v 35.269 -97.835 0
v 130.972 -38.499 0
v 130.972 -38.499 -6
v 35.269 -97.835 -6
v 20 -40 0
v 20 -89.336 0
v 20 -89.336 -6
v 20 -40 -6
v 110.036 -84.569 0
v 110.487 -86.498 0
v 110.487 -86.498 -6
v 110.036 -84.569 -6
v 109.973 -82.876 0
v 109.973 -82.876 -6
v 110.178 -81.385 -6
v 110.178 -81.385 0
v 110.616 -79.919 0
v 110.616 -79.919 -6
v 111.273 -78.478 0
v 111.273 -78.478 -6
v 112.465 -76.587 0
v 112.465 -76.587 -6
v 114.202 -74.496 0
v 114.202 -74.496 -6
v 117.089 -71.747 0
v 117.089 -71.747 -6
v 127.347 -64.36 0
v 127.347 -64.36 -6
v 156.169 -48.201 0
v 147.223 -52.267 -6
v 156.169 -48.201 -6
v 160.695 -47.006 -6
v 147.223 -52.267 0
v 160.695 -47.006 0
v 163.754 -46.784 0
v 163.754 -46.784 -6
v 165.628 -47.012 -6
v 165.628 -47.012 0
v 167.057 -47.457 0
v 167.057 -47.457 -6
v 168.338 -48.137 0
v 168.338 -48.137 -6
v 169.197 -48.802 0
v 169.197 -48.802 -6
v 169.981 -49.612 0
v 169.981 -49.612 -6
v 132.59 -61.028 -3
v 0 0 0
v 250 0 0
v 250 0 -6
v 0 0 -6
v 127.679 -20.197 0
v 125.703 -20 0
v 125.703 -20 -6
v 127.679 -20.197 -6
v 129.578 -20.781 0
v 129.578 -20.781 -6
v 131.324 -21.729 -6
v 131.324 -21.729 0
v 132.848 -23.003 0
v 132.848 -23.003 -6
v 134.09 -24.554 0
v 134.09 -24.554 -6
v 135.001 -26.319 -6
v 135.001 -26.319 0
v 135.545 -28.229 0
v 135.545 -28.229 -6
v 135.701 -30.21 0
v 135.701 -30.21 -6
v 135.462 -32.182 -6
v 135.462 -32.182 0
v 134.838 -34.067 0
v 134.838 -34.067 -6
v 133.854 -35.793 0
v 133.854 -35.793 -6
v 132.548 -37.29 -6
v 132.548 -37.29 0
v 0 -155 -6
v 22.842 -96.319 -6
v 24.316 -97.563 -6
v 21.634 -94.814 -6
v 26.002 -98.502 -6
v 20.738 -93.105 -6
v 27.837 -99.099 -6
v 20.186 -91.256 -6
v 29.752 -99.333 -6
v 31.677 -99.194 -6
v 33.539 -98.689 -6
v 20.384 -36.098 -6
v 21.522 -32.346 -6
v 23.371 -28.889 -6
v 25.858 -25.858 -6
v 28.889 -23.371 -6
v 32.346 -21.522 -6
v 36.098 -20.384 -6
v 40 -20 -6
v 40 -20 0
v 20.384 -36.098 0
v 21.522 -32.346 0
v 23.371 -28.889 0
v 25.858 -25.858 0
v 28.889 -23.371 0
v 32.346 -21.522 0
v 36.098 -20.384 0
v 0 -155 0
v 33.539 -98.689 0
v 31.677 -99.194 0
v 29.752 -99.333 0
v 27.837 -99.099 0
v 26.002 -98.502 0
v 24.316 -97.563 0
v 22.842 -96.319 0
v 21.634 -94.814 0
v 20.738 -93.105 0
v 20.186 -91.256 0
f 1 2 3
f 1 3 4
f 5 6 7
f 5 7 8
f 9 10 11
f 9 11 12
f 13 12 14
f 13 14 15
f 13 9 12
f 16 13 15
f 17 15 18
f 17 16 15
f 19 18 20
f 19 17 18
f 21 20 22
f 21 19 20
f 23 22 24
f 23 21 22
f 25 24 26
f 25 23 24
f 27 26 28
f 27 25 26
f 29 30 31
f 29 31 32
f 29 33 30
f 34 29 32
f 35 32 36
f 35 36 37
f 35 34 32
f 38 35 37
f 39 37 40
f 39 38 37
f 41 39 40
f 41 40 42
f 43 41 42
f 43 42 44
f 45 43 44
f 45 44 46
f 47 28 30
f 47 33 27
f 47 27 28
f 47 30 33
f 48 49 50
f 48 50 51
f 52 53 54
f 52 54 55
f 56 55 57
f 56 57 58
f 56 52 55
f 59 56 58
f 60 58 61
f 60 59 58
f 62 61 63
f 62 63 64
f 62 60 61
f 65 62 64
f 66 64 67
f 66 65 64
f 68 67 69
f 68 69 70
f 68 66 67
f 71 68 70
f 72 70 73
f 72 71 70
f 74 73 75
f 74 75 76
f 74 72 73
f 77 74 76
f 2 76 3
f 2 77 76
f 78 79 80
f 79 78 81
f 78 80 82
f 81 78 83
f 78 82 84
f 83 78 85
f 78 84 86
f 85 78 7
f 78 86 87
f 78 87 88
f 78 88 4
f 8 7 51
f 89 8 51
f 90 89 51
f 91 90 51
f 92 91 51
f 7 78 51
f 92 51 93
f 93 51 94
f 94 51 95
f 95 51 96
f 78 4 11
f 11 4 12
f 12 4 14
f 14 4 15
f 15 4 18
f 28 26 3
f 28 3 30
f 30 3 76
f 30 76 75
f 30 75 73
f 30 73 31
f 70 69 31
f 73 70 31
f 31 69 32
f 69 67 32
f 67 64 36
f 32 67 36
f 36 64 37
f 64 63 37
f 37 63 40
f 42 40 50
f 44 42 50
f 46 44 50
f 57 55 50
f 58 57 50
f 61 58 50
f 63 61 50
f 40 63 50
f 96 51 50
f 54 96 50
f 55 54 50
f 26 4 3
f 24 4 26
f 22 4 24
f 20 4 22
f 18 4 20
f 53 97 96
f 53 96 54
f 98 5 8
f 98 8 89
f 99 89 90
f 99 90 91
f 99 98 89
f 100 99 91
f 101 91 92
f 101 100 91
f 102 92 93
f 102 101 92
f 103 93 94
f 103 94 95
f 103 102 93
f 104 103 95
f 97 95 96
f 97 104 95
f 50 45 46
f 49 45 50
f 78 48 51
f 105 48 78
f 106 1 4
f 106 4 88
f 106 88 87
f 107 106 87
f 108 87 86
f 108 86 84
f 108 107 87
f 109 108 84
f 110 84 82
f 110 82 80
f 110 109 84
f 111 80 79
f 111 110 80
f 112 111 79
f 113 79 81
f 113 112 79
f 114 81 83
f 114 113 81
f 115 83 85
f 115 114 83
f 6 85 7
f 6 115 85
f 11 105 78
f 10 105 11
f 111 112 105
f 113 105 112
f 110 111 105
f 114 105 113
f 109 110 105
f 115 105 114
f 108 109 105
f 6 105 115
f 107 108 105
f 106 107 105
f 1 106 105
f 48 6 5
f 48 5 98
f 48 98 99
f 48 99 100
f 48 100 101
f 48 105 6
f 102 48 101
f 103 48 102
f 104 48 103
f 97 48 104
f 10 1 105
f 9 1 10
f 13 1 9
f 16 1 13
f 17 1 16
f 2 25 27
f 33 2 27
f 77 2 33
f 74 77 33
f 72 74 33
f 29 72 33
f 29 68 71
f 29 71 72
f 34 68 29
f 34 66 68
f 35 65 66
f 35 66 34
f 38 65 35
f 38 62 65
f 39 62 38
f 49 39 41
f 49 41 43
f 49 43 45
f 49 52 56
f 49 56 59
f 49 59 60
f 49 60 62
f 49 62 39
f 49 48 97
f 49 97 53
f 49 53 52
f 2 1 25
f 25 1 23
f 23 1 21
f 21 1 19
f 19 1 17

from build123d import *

# Parameters (mm, degrees)
F1_DEPTH = 6


with BuildPart() as f1:
    # F0 (on Top) → F1 (new body)
    with BuildSketch(Plane.XY):
        with BuildLine():
            Line((250, 0), (0, 0))
            Line((0, 0), (0, -155))
            Line((0, -155), (110.4873499226, -86.497843048))
            add(Edge.make_bspline(
                [(110.4873499226, -86.497843048), (107.2843735439, -77.0023074484), (131.9373436968, -61.4037722235), (163.3322021719, -41.7004632777), (169.9805383425, -49.6120662277)],
                knots=[0, 0, 0, 0, 0.2195299732, 0.4558974308, 0.4558974308, 0.4558974308, 0.4558974308], degree=3))
            Line((169.9805383425, -49.6120662277), (250, 0))
        make_face()
        with BuildLine():
            Line((20, -89.3357885437), (20, -40))
            ThreePointArc((20, -40), (25.8578643763, -25.8578643763), (40, -20))
            Line((40, -20), (125.702884748, -20))
            ThreePointArc((125.702884748, -20), (135.3203238346, -27.2604990574), (130.9722814366, -38.4990269171))
            Line((130.9722814366, -38.4990269171), (35.2693966886, -97.8348154609))
            ThreePointArc((35.2693966886, -97.8348154609), (25.1365632977, -98.0734646331), (20, -89.3357885437))
        make_face(mode=Mode.SUBTRACT)
    extrude(amount=-F1_DEPTH)


solid = f1.part
